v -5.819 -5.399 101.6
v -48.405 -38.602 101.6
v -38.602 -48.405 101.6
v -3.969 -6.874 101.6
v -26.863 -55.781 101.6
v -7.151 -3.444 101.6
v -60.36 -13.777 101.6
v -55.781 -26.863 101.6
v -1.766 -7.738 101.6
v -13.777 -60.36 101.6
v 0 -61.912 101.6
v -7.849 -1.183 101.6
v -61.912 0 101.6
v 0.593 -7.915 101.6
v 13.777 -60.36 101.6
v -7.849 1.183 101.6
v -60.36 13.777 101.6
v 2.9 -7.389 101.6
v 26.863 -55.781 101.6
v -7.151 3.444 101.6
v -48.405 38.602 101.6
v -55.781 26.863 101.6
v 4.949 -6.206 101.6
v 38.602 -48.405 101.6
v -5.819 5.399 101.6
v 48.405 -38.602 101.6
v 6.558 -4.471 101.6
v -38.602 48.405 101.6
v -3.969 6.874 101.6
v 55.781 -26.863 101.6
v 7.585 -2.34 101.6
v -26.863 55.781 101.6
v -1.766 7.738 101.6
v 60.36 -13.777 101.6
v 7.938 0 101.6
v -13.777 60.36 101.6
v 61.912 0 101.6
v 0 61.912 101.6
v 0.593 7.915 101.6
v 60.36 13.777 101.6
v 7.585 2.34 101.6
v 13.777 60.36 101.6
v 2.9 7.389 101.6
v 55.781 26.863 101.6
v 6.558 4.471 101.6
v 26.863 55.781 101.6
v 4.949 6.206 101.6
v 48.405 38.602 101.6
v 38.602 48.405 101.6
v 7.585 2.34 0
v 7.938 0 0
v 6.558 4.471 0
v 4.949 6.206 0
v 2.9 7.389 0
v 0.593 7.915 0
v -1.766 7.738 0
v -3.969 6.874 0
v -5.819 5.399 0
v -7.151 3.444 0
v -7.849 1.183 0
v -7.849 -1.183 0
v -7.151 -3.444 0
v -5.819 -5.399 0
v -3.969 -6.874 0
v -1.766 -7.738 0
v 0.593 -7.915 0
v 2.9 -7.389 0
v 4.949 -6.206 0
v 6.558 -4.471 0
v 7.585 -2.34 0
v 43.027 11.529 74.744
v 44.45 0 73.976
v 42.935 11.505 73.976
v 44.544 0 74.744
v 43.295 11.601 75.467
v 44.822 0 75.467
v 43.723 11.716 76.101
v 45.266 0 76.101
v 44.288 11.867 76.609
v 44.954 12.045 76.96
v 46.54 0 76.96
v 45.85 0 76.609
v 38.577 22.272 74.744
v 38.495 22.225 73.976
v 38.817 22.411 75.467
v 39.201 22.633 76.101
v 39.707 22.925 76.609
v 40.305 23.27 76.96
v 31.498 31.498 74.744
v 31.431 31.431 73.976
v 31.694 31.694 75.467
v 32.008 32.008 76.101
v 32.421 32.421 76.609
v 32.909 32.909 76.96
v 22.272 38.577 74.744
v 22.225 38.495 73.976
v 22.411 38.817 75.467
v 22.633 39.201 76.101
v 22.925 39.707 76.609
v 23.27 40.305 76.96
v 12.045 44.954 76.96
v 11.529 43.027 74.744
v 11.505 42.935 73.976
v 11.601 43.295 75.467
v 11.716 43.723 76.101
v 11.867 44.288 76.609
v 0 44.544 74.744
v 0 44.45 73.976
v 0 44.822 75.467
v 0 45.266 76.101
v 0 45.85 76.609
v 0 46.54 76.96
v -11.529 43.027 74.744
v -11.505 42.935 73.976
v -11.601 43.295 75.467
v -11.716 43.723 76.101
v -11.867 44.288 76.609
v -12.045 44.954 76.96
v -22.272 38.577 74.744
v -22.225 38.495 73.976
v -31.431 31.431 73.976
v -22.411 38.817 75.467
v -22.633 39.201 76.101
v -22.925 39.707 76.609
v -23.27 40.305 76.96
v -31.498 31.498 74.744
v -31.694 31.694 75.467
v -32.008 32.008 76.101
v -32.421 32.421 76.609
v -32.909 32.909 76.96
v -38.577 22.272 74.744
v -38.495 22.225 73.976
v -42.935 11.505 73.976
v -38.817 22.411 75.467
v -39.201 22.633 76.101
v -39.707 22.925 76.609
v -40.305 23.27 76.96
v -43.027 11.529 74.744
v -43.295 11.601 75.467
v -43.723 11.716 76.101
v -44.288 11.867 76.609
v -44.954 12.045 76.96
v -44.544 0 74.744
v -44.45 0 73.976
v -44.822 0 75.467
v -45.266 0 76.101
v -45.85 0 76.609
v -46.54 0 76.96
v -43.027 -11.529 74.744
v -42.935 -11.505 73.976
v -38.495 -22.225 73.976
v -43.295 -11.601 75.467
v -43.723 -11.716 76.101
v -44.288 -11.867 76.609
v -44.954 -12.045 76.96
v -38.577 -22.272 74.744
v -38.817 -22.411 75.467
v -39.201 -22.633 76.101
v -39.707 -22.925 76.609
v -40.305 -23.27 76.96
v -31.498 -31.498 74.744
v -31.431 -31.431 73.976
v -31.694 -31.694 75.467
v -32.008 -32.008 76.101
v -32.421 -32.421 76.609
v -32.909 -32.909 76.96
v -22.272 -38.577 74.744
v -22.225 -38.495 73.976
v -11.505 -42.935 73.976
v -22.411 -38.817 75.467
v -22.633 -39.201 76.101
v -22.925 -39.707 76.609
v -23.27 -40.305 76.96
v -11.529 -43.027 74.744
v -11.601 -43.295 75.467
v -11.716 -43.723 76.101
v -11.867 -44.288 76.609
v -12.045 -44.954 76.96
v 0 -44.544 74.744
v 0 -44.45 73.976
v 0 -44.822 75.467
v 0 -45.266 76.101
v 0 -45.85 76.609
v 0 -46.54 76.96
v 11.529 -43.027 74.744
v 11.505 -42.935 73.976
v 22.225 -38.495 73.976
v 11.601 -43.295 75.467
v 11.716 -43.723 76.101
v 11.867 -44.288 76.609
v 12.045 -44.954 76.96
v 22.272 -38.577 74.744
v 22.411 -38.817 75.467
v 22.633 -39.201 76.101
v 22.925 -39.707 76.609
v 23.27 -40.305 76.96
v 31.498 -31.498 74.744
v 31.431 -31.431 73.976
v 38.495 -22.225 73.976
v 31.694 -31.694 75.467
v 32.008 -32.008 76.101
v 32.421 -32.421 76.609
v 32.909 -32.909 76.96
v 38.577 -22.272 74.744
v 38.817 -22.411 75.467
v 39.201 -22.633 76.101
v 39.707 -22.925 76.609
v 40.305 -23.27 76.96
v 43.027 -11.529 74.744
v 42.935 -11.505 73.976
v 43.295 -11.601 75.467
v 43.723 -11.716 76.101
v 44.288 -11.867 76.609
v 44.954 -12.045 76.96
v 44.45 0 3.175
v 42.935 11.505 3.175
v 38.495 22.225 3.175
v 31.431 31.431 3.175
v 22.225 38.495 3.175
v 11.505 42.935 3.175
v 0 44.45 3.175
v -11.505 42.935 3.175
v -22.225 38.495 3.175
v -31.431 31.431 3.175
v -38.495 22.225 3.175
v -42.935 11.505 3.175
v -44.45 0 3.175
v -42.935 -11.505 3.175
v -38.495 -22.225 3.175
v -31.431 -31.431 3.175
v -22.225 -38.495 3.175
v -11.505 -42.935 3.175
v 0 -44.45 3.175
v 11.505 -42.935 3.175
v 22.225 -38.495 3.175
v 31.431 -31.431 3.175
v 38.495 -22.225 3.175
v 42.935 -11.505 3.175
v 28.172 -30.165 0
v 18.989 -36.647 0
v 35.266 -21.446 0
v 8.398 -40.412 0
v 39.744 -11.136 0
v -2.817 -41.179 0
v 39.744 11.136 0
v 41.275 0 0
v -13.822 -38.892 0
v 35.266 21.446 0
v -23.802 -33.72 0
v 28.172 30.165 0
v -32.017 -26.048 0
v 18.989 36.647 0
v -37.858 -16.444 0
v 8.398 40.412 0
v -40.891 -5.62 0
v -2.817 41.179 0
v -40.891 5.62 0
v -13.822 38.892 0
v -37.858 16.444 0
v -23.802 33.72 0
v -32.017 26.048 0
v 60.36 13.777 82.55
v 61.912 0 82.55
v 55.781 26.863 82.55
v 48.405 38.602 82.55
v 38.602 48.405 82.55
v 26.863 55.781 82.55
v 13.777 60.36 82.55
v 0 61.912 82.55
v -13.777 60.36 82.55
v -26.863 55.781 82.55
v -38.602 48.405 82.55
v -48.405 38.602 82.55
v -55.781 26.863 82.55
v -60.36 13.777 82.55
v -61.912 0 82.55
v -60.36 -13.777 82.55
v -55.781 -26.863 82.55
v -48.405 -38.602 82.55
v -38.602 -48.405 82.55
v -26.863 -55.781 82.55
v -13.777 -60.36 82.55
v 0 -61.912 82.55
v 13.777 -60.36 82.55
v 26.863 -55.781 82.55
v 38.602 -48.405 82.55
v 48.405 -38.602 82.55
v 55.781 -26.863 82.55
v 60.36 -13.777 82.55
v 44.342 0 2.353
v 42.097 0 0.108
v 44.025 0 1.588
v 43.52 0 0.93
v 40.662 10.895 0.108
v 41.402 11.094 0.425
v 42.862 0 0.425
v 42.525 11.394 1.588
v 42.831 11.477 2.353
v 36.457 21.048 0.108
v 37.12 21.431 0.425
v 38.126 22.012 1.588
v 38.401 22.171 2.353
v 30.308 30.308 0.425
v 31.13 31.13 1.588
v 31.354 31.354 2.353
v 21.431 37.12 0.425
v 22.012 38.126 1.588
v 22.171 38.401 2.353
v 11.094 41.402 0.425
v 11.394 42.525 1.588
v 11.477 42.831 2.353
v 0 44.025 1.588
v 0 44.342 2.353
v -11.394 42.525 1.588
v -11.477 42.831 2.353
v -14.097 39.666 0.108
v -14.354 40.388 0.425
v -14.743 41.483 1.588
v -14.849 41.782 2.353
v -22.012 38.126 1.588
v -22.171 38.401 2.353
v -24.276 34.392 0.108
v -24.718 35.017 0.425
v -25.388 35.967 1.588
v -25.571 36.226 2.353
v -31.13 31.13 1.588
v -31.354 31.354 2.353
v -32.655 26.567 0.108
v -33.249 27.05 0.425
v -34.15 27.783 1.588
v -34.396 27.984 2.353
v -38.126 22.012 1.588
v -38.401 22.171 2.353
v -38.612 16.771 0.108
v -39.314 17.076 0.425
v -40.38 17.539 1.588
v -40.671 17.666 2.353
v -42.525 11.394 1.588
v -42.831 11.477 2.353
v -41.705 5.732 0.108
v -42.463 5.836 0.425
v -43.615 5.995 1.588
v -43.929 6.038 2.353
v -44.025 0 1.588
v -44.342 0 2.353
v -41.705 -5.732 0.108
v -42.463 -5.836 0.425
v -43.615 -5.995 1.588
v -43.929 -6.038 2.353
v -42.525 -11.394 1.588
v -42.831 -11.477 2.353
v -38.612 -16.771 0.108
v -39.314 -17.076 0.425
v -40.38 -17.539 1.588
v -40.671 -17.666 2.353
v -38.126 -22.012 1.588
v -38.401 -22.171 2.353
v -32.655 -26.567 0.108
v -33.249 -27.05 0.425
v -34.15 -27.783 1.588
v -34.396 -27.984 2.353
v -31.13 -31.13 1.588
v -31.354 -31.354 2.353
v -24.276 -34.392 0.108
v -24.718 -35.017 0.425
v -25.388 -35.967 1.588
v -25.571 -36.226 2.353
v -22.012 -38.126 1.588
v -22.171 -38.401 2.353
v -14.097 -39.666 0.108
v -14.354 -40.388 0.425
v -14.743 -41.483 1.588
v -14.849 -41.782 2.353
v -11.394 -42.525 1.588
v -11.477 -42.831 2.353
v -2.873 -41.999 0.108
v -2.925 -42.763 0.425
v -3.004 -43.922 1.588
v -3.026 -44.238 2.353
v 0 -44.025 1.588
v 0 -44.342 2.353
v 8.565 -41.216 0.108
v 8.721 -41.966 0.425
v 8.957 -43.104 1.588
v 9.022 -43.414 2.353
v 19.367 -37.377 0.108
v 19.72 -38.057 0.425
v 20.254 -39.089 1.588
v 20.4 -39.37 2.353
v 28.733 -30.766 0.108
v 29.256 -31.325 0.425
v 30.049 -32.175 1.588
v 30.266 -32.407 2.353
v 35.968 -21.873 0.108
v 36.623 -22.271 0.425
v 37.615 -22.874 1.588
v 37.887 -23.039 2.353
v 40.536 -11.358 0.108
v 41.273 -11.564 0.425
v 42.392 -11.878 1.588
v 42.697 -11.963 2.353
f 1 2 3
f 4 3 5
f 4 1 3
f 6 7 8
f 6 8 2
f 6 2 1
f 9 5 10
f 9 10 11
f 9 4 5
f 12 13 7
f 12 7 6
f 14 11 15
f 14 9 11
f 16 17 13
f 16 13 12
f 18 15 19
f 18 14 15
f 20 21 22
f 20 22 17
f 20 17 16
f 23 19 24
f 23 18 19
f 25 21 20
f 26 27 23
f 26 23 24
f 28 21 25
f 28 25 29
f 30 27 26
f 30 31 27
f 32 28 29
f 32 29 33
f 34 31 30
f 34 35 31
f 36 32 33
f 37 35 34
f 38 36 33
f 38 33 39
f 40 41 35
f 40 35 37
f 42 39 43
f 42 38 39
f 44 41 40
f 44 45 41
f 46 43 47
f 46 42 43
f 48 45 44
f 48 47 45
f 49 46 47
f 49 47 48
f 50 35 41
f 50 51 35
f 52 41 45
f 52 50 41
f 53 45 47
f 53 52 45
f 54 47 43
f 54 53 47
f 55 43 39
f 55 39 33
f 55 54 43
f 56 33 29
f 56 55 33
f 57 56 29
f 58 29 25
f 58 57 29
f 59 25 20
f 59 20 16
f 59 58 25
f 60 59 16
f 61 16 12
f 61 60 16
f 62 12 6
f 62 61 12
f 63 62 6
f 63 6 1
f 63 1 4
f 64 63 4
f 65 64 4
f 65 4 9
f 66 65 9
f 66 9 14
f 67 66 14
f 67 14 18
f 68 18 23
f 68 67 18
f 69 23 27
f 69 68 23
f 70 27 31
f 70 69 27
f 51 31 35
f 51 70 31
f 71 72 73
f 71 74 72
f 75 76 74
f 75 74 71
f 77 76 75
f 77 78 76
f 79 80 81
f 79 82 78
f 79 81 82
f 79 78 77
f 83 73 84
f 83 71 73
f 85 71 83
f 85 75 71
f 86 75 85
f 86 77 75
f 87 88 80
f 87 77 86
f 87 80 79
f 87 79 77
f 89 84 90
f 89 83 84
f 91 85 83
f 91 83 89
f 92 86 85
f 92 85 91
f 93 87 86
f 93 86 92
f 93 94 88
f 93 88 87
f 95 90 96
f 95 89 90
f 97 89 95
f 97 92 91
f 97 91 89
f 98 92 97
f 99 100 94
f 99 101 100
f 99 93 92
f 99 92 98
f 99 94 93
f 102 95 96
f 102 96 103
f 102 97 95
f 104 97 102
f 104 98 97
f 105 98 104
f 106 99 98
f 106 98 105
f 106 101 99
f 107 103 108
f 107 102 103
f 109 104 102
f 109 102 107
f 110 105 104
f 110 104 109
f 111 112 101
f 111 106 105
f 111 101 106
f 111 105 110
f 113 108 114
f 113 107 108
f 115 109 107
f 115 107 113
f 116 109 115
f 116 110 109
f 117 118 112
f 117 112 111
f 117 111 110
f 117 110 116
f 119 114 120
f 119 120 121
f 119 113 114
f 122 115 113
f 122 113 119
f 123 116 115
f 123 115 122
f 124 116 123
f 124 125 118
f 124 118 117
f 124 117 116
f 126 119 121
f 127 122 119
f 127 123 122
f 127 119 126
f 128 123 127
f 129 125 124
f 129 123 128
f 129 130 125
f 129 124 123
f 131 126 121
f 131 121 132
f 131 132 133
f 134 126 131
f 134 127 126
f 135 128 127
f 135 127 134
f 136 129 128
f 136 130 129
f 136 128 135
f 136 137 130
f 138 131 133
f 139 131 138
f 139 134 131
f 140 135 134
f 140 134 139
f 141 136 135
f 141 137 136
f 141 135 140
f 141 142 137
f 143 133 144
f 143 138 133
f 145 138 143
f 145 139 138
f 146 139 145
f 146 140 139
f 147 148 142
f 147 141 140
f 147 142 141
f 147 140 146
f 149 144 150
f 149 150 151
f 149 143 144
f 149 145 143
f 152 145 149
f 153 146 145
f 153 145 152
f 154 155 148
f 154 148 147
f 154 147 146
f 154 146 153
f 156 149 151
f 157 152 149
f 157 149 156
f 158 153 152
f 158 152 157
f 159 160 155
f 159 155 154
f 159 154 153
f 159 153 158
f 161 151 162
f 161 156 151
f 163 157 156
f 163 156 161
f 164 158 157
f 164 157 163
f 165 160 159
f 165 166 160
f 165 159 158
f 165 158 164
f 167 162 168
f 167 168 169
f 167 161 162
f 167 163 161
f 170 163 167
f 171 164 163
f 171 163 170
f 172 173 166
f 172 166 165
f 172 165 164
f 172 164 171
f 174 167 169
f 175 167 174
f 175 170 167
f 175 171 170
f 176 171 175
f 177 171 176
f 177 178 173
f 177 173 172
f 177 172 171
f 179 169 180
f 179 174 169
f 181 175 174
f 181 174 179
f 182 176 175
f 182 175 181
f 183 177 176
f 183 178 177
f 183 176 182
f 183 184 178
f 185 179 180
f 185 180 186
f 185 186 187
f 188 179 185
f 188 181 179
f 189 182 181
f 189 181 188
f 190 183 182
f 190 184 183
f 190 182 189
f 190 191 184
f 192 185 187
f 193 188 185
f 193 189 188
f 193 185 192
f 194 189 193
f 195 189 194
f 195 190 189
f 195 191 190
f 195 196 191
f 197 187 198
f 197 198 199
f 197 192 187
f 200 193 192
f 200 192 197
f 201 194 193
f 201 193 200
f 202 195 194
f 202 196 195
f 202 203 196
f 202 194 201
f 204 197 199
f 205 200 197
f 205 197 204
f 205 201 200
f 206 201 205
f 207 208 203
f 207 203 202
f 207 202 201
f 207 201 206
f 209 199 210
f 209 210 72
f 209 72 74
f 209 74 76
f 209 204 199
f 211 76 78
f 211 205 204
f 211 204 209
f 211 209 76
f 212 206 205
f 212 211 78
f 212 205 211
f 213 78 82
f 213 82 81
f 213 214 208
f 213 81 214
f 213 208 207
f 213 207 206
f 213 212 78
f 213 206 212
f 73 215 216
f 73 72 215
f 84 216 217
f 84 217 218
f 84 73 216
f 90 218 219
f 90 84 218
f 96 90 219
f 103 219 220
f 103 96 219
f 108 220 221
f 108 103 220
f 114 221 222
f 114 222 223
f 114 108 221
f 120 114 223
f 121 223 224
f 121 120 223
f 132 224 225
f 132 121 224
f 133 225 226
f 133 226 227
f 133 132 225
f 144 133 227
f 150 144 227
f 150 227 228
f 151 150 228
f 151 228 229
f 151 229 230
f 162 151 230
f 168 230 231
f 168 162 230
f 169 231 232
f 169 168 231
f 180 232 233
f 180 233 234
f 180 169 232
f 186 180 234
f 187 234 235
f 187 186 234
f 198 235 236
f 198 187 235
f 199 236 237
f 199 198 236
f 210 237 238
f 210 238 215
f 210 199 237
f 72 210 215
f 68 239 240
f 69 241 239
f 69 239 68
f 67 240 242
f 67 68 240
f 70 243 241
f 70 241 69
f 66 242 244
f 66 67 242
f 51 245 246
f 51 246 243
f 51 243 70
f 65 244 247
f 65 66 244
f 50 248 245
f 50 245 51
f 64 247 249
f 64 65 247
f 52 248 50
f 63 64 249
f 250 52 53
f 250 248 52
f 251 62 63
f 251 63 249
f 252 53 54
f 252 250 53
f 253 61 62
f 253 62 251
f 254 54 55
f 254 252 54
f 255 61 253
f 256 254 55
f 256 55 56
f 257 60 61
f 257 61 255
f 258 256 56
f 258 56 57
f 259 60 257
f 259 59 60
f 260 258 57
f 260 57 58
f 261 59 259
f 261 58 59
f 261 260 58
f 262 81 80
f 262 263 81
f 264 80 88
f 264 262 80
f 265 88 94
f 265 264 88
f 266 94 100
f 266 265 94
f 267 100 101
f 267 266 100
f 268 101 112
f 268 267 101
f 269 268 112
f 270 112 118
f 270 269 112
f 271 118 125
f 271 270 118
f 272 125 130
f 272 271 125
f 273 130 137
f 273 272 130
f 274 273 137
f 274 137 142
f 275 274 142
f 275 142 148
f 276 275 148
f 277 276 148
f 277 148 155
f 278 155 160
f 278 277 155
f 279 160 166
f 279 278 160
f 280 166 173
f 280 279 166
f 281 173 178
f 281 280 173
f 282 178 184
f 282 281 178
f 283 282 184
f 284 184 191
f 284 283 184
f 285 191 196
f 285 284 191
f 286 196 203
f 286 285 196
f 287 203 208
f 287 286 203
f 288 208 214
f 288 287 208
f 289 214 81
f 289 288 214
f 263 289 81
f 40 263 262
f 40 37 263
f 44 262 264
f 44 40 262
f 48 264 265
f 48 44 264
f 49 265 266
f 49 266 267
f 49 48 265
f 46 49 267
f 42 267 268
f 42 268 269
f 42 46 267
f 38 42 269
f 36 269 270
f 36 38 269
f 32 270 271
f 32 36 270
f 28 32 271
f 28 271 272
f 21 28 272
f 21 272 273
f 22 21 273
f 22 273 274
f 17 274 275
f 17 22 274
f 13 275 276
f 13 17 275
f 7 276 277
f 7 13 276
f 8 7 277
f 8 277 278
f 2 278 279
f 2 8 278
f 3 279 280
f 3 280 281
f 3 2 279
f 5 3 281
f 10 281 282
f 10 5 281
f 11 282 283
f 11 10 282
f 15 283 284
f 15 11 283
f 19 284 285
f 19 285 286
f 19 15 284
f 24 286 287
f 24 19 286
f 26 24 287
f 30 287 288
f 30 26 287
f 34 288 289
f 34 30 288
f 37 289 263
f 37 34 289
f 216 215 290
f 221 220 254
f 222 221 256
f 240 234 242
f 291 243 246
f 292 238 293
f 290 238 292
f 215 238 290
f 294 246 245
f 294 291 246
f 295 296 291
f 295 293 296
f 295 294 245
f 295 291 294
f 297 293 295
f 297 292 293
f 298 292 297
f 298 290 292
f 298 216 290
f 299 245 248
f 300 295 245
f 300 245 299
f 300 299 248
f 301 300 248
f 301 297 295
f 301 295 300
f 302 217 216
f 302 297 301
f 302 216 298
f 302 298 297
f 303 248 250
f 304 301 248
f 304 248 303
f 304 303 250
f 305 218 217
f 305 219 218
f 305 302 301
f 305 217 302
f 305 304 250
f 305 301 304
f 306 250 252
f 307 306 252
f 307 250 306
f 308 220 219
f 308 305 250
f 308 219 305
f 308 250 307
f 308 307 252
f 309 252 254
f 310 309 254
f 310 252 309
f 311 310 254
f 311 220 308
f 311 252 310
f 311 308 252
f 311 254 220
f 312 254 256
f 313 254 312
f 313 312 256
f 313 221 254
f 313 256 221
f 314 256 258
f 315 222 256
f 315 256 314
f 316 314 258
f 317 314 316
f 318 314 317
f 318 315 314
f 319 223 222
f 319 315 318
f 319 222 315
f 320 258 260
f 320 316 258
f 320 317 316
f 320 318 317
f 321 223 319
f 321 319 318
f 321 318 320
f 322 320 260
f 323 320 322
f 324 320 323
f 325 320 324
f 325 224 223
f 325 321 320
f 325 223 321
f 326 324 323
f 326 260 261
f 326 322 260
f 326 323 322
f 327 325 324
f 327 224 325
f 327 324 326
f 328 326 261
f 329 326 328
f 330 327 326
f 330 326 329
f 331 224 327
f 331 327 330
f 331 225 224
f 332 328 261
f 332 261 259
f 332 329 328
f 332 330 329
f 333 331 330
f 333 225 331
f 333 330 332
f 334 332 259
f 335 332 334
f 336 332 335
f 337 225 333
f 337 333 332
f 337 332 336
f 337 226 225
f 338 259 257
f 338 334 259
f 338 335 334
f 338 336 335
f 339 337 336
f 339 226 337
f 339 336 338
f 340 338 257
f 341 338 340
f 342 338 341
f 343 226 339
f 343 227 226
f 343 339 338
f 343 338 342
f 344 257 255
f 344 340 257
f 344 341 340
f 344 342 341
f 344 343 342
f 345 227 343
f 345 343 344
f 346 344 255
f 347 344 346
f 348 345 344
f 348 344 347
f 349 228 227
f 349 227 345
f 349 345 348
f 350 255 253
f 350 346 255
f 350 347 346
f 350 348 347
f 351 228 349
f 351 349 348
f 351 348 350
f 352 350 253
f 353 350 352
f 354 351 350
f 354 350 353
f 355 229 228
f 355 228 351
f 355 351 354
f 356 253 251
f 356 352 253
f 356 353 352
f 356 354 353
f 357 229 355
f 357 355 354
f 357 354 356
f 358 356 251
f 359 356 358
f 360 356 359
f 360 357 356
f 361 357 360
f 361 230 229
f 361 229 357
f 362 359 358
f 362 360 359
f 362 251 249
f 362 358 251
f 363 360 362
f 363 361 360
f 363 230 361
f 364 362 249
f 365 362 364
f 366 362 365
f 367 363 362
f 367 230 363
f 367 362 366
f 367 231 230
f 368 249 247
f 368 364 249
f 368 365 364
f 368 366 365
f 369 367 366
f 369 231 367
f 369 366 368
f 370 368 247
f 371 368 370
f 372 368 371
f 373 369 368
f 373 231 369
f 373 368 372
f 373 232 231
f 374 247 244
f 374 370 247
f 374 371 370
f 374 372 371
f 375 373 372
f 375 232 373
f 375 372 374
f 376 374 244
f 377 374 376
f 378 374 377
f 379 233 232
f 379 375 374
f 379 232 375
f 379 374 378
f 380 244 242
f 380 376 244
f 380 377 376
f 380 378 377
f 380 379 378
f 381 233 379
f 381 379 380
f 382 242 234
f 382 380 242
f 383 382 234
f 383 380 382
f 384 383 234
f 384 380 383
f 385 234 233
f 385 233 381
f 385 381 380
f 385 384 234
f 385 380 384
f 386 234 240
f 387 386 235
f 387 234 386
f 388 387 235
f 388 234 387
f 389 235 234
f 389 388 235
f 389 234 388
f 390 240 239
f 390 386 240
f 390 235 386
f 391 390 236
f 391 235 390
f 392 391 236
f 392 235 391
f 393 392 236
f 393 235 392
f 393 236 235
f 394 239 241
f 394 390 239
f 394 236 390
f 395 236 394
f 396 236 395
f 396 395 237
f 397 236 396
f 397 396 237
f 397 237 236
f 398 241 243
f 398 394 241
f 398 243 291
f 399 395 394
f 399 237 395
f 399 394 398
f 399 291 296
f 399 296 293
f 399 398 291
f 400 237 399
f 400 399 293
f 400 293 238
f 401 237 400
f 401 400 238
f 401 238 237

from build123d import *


with BuildPart() as f1:
    # F0 (on Front) → F1 (revolve)
    with BuildSketch(Plane.XZ):
        with BuildLine():
            Line((7.9375, 101.6), (7.9375, 0))
            Line((7.9375, 0), (41.275, 0))
            ThreePointArc((41.275, 0), (43.520064, 0.929936), (44.45, 3.175))
            Line((44.45, 3.175), (44.45, 73.976143))
            ThreePointArc((44.45, 73.976143), (45.024461, 75.797632), (46.539966, 76.959988))
            Line((46.539966, 76.959988), (61.9125, 82.55))
            Line((61.9125, 82.55), (61.9125, 98.425))
            Line((61.9125, 98.425), (61.9125, 101.6))
            Line((61.9125, 101.6), (58.7375, 101.6))
            Line((58.7375, 101.6), (7.9375, 101.6))
        make_face()
    revolve(axis=Axis((0, 0, 44.177184), (0, 0, 1)))


solid = f1.part
